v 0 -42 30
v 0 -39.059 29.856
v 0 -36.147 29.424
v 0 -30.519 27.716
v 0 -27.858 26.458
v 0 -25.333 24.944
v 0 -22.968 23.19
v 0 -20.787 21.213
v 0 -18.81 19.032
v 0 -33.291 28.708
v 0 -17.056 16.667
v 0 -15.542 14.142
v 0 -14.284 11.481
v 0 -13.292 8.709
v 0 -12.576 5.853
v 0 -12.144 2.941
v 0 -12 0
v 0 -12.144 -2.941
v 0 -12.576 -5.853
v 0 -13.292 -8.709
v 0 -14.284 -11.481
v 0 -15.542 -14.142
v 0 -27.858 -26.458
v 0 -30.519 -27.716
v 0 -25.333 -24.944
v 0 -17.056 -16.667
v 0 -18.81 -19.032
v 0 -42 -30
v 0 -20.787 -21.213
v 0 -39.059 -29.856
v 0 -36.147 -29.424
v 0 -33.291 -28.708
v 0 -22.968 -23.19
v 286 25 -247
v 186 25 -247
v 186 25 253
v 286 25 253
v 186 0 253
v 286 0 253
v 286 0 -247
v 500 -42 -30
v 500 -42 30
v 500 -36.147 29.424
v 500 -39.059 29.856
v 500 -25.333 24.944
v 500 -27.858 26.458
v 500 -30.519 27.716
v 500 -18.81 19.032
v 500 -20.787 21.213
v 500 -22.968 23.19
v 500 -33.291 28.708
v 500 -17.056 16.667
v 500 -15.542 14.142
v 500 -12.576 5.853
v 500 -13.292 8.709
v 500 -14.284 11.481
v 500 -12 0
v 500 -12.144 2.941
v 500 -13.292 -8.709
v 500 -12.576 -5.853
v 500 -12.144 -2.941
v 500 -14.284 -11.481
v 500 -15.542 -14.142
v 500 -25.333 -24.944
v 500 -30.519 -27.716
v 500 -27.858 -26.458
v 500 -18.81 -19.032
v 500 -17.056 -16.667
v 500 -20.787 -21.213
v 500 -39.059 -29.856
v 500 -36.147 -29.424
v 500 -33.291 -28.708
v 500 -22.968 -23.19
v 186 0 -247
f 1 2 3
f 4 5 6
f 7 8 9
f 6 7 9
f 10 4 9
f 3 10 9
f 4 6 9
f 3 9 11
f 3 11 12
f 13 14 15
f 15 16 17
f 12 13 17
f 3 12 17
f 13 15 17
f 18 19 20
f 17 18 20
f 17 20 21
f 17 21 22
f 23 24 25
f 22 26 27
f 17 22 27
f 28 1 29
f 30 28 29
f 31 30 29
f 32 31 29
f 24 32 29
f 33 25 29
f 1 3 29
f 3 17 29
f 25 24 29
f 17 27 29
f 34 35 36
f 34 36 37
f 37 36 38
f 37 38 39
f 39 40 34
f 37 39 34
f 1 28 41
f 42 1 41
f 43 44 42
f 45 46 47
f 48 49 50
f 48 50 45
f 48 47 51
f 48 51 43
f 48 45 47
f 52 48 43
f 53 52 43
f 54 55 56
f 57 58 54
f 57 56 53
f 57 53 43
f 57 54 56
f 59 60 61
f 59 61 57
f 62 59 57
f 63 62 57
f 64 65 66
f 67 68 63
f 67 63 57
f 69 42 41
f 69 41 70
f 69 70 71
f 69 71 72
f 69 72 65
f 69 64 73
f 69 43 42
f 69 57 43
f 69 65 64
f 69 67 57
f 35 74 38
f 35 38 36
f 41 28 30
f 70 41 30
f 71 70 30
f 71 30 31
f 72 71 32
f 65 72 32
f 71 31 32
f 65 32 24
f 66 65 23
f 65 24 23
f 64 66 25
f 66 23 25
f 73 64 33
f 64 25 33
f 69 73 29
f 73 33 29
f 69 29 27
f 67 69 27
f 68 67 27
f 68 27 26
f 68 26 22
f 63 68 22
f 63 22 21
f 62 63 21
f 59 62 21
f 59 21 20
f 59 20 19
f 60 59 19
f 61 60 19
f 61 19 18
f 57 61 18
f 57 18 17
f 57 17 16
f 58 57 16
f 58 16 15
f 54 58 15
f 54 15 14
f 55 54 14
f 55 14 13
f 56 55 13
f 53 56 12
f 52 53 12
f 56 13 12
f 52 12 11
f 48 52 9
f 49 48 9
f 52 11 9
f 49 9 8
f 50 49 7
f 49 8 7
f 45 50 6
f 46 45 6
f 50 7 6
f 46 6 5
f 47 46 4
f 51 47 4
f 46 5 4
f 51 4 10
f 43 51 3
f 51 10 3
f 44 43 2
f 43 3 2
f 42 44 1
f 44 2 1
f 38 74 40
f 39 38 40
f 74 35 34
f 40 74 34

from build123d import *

# Parameters (mm, degrees)
BOTTOMBOX_W          = 600
BOTTOMBOX_H          = 100
BOTTOMBOX_DEPTH      = 100
BOTTOMCYLINDER_R     = 30
BOTTOMCYLINDER_DEPTH = 500
TOPBOX_W             = 100
TOPBOX_H             = 25
TOPBOX_DEPTH         = 500


with BuildPart() as bottombox:
    # BottomBox → BottomBox (new body)
    with BuildSketch(Plane(origin=(-10, -142, -52), x_dir=(1, 0, 0), z_dir=(0, 0, 1))):
        with Locations((300, 50)):
            Rectangle(BOTTOMBOX_W, BOTTOMBOX_H)
    extrude(amount=BOTTOMBOX_DEPTH)


with BuildPart() as bottomhalfcylinder:
    # BottomCylinder → BottomCylinder (new body)
    with BuildSketch(Plane(origin=(0, -42, 0), x_dir=(0, 0, -1), z_dir=(1, 0, 0))):
        Circle(BOTTOMCYLINDER_R)
    extrude(amount=BOTTOMCYLINDER_DEPTH)

    # BottomHalfCylinder: cut BottomBox
    add(bottombox.part, mode=Mode.SUBTRACT)


with BuildPart() as allgeomfusion:
    # TopBox → TopBox (new body)
    with BuildSketch(Plane(origin=(186, 0, -247), x_dir=(1, 0, 0), z_dir=(0, 0, 1))):
        with Locations((50, 12.5)):
            Rectangle(TOPBOX_W, TOPBOX_H)
    extrude(amount=TOPBOX_DEPTH)

    # AllGeomFusion: union BottomHalfCylinder
    add(bottomhalfcylinder.part)


solid = allgeomfusion.part
